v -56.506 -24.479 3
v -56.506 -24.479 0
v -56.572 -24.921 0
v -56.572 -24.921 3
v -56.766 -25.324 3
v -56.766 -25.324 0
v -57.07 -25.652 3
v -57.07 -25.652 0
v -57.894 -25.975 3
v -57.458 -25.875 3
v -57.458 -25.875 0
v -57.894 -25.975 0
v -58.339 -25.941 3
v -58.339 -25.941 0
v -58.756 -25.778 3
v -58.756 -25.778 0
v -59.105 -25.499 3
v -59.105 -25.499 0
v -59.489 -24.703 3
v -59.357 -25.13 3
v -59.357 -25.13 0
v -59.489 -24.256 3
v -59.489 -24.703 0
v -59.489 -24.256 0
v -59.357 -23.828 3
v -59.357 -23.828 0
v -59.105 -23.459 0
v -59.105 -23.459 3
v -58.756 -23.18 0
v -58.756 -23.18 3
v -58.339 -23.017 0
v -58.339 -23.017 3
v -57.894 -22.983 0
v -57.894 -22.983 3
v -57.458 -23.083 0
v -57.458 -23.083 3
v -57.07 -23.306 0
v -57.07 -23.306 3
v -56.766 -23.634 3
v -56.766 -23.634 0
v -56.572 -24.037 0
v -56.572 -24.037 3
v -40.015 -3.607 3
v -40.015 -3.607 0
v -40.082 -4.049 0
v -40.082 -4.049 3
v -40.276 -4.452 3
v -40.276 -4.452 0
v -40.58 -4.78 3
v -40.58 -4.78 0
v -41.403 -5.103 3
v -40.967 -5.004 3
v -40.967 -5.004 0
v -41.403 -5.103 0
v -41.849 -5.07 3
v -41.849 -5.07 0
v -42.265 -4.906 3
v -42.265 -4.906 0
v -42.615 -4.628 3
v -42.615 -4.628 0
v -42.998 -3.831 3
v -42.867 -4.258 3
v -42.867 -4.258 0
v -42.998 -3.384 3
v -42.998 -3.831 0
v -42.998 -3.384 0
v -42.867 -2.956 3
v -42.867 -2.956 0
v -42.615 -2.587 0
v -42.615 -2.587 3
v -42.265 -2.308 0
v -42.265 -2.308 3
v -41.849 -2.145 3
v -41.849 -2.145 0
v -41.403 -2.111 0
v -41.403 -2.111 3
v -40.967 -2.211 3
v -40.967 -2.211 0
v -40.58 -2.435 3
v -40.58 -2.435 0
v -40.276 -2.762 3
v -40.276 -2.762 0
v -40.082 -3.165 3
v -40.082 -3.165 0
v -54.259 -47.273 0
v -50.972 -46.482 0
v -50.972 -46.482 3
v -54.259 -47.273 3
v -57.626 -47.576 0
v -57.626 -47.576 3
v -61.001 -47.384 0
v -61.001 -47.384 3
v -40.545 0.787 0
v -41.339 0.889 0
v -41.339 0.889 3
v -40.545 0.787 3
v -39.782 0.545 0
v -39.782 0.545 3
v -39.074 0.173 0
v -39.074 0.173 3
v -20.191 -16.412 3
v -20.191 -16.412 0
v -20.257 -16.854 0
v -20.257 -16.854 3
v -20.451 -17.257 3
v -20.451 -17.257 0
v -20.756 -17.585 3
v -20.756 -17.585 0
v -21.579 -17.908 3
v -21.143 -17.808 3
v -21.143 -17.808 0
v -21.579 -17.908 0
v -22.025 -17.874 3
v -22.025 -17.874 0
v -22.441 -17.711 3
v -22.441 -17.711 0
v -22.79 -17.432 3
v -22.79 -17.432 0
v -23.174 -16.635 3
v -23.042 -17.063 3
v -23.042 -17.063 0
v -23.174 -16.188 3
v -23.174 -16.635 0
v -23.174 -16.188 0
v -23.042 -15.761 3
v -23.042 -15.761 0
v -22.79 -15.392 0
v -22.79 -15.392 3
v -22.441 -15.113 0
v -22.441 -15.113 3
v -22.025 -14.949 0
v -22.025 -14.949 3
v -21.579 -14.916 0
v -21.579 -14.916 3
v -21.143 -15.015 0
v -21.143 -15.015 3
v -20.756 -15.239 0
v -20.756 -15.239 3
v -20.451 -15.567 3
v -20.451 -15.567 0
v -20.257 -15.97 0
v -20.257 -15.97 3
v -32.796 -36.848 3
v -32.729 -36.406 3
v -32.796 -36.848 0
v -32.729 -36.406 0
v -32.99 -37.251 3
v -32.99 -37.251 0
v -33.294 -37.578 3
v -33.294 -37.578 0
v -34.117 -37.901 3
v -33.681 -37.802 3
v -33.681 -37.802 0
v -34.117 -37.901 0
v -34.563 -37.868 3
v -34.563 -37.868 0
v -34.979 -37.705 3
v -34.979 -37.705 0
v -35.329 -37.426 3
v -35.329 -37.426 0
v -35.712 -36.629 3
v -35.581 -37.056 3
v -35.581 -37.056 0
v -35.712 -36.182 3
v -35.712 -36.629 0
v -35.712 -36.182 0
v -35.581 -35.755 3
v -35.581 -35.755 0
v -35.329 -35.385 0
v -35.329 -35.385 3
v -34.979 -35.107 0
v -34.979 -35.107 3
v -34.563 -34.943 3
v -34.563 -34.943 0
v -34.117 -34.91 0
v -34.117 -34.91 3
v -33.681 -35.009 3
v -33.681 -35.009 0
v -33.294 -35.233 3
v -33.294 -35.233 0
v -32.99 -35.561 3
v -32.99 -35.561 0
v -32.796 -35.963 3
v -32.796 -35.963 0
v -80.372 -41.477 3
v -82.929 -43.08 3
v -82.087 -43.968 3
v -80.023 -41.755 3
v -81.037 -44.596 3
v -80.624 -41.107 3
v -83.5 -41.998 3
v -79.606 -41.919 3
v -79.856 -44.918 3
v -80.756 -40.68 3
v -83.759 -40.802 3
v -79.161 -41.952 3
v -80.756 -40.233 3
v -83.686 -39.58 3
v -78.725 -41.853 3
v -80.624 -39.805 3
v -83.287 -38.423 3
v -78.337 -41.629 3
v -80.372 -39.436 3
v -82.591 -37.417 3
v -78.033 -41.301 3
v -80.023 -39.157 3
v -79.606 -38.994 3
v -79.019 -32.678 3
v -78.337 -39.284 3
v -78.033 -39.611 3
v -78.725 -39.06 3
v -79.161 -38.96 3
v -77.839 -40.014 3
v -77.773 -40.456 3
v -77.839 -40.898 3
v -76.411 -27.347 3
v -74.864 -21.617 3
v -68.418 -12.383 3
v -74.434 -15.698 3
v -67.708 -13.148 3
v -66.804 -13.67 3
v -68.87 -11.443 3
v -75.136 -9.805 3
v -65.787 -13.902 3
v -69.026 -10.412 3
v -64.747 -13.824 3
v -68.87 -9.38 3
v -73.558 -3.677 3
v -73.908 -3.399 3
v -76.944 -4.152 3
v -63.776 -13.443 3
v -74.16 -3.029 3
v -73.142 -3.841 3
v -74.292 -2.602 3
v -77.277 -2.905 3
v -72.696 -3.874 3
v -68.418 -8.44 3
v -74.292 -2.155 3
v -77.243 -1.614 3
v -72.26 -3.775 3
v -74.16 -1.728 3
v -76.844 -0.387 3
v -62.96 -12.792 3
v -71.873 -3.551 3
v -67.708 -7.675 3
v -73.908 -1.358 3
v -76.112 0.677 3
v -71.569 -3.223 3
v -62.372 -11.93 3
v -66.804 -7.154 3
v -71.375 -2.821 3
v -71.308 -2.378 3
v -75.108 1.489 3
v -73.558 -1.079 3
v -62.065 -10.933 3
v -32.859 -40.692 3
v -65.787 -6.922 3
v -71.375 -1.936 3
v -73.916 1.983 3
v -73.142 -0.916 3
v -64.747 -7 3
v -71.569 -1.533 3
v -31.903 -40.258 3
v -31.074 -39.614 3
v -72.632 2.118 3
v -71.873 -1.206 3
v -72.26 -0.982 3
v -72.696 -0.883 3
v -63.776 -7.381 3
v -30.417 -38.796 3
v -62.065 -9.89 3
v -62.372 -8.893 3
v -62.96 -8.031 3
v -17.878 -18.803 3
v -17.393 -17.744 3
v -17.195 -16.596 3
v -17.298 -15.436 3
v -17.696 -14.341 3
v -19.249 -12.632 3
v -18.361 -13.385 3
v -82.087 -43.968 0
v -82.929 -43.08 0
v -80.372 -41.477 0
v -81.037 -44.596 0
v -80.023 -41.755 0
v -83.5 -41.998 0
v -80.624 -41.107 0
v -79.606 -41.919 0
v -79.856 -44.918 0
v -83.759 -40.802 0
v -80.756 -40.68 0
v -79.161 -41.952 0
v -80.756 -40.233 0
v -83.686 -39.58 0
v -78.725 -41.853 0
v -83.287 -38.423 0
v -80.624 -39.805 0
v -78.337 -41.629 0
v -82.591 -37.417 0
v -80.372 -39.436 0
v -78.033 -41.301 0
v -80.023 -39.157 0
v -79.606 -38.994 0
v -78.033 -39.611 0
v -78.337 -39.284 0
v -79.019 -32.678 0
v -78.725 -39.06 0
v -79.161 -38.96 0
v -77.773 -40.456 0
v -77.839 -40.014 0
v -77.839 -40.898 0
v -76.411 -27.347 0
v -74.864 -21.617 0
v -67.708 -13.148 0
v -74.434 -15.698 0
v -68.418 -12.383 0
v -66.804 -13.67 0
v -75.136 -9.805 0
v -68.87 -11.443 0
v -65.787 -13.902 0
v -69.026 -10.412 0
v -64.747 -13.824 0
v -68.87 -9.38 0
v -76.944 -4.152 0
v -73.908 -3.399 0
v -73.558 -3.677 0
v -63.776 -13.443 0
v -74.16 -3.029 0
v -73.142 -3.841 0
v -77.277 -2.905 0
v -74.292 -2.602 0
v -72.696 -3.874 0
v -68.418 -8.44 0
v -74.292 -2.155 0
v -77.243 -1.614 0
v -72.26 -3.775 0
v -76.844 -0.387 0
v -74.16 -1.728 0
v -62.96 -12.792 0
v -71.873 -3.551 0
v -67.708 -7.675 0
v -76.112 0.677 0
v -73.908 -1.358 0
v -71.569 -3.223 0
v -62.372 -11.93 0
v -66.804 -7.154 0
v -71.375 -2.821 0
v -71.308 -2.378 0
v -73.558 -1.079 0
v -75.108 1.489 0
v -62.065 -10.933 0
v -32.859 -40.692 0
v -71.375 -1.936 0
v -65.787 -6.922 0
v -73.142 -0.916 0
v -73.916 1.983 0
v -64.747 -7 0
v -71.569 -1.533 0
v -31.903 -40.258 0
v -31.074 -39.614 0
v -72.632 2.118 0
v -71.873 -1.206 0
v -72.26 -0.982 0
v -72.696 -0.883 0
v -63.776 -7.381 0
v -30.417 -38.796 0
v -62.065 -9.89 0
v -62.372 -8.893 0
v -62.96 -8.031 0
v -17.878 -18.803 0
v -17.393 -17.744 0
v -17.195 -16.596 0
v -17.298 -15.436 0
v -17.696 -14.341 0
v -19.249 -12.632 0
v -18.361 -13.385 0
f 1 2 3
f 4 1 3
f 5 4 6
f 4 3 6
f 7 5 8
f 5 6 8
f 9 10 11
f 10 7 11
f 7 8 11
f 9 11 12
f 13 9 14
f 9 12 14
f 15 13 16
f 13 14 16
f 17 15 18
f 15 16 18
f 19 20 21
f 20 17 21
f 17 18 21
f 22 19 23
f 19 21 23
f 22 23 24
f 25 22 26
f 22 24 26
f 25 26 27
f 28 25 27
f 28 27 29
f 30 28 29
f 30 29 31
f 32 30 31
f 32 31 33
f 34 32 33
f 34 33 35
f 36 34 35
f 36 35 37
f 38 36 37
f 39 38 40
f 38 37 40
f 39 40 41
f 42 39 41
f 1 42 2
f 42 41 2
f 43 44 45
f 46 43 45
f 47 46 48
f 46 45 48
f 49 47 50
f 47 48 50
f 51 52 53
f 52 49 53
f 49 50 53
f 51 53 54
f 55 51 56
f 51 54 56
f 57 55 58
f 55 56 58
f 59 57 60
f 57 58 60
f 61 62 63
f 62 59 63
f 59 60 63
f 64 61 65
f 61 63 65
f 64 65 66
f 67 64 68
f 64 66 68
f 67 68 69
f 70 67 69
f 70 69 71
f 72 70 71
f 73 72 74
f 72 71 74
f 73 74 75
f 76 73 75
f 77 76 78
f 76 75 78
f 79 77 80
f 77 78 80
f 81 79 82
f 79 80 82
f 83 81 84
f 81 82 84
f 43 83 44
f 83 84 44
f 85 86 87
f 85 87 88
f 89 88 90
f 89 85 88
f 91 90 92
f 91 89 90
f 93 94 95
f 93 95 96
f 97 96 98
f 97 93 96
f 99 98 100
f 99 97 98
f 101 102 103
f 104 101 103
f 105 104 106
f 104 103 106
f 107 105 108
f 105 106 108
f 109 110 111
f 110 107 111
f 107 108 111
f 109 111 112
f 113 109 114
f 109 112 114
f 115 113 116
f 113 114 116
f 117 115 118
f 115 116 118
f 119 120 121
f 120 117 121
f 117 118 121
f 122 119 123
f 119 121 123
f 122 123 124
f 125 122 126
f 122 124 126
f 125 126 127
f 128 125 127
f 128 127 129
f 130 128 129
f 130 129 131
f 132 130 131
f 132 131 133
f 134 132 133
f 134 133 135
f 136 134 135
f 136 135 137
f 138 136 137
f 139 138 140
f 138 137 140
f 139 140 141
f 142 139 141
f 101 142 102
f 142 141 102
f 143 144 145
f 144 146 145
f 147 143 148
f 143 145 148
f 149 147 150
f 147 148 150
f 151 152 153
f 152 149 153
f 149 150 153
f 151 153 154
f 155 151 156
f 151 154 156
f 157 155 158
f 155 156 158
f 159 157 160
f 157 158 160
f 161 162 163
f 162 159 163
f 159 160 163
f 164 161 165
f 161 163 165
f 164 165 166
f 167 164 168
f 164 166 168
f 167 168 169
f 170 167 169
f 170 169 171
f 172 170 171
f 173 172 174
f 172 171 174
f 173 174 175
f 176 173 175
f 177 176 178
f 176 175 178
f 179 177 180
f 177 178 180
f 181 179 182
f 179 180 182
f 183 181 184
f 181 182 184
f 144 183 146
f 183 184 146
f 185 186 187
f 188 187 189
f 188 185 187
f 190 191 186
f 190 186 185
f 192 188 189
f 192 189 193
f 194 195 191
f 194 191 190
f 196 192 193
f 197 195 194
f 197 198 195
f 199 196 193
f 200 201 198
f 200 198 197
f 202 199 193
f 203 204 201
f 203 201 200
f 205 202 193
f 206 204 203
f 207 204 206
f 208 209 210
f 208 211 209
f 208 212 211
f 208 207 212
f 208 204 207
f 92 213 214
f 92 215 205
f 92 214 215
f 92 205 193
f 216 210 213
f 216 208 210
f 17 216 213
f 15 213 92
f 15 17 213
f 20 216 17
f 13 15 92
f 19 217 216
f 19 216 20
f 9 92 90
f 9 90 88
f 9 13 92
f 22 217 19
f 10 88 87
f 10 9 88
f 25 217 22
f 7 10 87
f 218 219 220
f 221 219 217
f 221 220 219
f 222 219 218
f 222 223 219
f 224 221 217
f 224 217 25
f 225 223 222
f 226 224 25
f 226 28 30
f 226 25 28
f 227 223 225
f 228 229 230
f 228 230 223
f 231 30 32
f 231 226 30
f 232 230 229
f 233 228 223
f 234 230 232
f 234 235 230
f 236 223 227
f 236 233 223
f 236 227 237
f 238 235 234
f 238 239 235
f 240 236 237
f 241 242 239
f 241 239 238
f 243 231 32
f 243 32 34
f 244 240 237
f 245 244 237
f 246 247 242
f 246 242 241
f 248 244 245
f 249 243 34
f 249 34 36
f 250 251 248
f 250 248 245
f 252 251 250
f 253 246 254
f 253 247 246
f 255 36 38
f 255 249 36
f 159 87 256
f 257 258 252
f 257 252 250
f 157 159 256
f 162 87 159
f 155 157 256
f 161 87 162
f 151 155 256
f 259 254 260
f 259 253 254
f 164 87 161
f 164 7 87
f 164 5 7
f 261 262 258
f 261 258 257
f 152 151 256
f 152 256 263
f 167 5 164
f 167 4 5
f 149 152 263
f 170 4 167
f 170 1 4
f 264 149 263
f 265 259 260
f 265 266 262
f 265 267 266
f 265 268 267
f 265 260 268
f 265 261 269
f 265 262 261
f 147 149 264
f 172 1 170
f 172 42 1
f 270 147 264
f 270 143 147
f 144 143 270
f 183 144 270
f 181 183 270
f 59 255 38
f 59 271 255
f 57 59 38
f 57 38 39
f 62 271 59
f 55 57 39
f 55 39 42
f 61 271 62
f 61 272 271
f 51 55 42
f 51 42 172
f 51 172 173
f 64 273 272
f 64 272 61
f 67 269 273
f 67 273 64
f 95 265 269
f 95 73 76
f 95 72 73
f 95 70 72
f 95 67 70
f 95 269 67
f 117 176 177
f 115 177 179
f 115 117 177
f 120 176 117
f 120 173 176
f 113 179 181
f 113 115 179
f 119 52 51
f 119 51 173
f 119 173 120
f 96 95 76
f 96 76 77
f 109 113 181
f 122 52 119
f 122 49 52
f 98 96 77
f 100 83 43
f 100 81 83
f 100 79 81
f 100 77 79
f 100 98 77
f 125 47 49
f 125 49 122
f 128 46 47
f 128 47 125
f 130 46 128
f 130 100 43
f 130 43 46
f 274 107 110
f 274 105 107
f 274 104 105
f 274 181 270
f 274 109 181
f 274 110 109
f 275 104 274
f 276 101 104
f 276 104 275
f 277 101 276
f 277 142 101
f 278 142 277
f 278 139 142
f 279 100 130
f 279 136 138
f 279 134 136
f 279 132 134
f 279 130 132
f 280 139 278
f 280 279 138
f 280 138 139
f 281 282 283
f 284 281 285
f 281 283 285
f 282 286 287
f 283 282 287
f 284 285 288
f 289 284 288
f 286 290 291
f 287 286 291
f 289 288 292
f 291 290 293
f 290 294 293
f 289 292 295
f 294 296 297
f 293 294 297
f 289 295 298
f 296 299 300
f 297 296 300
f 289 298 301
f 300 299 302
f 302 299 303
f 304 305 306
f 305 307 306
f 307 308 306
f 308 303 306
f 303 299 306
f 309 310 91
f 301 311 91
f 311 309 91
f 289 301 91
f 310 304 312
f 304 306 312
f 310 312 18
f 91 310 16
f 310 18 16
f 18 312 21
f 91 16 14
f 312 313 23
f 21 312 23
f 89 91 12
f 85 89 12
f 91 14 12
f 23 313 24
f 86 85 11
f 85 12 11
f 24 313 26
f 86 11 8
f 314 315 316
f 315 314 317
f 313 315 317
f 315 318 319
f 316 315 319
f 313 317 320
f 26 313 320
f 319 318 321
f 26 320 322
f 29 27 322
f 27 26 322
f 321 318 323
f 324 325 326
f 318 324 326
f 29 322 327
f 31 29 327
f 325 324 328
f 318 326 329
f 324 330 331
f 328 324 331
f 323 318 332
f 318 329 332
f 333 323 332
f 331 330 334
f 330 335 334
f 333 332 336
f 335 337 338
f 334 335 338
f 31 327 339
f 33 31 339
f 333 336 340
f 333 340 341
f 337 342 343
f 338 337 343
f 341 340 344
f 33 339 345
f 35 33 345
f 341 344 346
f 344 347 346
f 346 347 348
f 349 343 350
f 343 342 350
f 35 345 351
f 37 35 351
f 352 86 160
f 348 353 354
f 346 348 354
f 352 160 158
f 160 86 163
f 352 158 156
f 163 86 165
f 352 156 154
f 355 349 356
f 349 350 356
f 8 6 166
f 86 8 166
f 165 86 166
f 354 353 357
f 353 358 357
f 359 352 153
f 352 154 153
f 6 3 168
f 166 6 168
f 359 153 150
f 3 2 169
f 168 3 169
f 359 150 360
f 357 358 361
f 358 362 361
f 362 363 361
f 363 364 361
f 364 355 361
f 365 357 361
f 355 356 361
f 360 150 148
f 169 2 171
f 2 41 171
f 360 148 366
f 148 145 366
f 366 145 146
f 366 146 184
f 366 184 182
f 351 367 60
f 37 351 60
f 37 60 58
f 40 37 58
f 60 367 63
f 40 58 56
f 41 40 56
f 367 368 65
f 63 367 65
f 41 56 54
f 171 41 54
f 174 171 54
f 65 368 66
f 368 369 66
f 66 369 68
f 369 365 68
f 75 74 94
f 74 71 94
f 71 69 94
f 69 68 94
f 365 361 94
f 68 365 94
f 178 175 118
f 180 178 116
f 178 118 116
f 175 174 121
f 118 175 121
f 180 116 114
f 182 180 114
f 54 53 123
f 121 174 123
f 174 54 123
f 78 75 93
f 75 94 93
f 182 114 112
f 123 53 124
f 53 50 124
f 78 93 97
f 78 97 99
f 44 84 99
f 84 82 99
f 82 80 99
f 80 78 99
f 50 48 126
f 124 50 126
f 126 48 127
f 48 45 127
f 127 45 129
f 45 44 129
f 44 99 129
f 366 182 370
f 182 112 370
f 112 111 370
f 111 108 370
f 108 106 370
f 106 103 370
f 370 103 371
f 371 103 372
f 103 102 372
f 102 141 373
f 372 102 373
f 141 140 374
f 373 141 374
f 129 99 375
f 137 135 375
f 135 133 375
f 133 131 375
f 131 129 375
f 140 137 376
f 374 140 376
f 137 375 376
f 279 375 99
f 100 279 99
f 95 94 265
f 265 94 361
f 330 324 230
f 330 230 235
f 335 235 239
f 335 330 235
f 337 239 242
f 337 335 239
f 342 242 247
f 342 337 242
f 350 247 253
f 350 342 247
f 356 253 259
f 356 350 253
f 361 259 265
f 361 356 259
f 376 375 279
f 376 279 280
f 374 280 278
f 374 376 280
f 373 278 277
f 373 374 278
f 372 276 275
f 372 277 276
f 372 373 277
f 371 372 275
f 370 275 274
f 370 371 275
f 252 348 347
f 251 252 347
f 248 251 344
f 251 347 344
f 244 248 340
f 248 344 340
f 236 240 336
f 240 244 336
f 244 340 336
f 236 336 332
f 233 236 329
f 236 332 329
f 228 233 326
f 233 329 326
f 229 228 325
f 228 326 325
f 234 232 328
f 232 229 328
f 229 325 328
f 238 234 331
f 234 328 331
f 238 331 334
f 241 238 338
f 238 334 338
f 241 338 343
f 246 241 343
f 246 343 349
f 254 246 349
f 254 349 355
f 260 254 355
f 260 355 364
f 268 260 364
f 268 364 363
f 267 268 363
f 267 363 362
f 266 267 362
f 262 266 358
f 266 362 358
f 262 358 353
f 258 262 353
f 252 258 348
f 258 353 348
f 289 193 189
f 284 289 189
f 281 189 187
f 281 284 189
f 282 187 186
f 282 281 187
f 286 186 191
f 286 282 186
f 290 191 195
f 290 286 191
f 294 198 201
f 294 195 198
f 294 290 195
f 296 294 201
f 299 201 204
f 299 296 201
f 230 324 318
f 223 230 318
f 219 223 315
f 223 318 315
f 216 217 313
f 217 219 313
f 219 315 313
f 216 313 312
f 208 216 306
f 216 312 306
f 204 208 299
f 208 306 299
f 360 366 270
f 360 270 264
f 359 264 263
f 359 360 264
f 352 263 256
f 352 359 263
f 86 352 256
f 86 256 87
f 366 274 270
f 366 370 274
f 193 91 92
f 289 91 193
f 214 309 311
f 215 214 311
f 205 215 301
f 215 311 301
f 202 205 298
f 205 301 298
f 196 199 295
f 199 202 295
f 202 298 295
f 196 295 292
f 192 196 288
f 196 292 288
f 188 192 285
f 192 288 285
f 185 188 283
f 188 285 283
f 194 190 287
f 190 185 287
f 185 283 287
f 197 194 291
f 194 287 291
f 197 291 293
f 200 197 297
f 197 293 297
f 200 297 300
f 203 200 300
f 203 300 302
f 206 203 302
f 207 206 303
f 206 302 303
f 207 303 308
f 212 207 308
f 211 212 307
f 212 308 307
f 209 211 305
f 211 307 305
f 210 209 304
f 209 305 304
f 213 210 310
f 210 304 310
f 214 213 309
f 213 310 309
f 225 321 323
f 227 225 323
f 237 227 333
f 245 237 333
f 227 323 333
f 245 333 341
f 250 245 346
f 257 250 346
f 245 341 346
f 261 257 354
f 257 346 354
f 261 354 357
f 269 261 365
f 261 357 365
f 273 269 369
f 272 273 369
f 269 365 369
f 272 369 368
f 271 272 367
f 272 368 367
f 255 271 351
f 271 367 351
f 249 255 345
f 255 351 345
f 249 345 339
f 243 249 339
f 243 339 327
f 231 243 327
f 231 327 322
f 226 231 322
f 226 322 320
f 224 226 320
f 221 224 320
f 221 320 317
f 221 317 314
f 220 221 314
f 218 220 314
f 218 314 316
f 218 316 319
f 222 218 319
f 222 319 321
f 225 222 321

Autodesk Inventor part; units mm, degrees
ref_plane "YZ Plane" through (0, 0, 0) normal (1, 0, 0) x (0, 1, 0)
ref_plane "XZ Plane" through (0, 0, 0) normal (0, 1, 0) x (-1, 0, 0)
ref_plane "XY Plane" through (0, 0, 0) normal (0, 0, 1) x (1, 0, 0)
sketch "スケッチ1" plane through (0, 0, 0) normal (0, 0, 1) x (1, 0, 0)
  circle A0 centre (-21.6908, -16.4118) radius 19.1 construction
  circle A1 centre (-58.0056, -24.4791) radius 22.1 construction
  circle A2 centre (-105.5257, -16.4118) radius 30.1 construction
  circle A3 centre (-122.6945, 30.2622) radius 1.5
  circle A4 centre (-75.5257, 23.124) radius 1.5
  circle A5 centre (-65.5257, -10.4118) radius 1.5
  circle A6 centre (-145.5257, 0.5882) radius 1.5
  circle A7 centre (-105.5257, -16.4118) radius 7.025
  circle A8 centre (-21.6908, -16.4118) radius 1.5
  arc A9 (-17.8785, -18.8026) -> (-19.2493, -12.6317) centre (-21.6908, -16.4118) ccw
  arc A10 (-61.0009, -47.384) -> (-50.9717, -46.4821) centre (-58.0056, -24.4791) ccw
  circle A11 centre (-34.2292, -36.4056) radius 1.5
  circle A12 centre (-41.5152, -3.6073) radius 1.5
  arc A13 (-39.0737, 0.1727) -> (-41.3386, 0.8892) centre (-41.5152, -3.6073) ccw
  arc A14 (-32.8589, -40.6919) -> (-30.4168, -38.7963) centre (-34.2292, -36.4056) ccw
  circle A15 centre (-79.2726, -40.4563) radius 1.5
  circle A16 centre (-79.2726, -40.4563) radius 4.5
  line L0 (-17.8785, -18.8026) -> (-30.4168, -38.7963)
  line L1 (-32.8589, -40.6919) -> (-50.9717, -46.4821)
  line L2 (-19.2493, -12.6317) -> (-39.0737, 0.1727)
  arc A17 (-149.0922, 3.3323) -> (-149.4523, -1.6098) centre (-145.5257, 0.5882) ccw
  line L3 (-149.4523, -1.6098) -> (-132.6633, -31.6026)
  line L4 (-102.3494, -47.3492) -> (-78.813, -44.9328)
  line L5 (-61.0009, -47.384) -> (-79.8561, -44.9183)
  circle A18 centre (-72.8083, -2.3784) radius 1.5
  arc A19 (-72.6317, 2.1181) -> (-76.944, -4.1523) centre (-72.8083, -2.3784) ccw
  line L6 (-41.3386, 0.8892) -> (-72.6317, 2.1181)
  arc A20 (-61.4337, -12.2841) -> (-61.2133, -9.1259) centre (-65.5257, -10.4118) ccw
  line L7 (-61.4337, -12.2841) -> (-75.1806, -42.3286)
  arc A21 (-82.5911, -37.417) -> (-76.944, -4.1523) centre (-105.5257, -16.4118) ccw
  arc A22 (-132.6633, -31.6026) -> (-102.3494, -47.3492) centre (-105.5257, -16.4118) ccw
  arc A23 (-122.0212, 34.7115) -> (-126.261, 33.0062) centre (-122.6945, 30.2622) ccw
  arc A24 (-71.2133, 24.4099) -> (-74.8523, 27.5733) centre (-75.5257, 23.124) ccw
  line L8 (-126.261, 33.0062) -> (-149.0922, 3.3323)
  line L9 (-122.0212, 34.7115) -> (-74.8523, 27.5733)
  line L10 (-71.2133, 24.4099) -> (-61.2133, -9.1259)
  circle A25 centre (-58.0056, -24.4791) radius 1.5
  point P0 (0, 0)
  point P1 (0, 0)
  dimension "d0" = 14.05
  dimension "d1" = 3
  dimension "d2" = 3
  dimension "d3" = 1
  dimension "d4" = 3
  dimension "d5" = 3
  dimension "d6" = 3
  dimension "d7" = 3
  dimension "d8" = 3
  dimension "d9" = 3
  dimension "d10" = 9
  dimension "d11" = 3
  dimension "d12" = 3
  dimension "d13" = 9
  dimension "d14" = 31.1
  dimension "d15" = 31.1
  dimension "d16" = 9
  dimension "d17" = 9
  dimension "d18" = 3
extrude "押し出し1" add sketch "スケッチ1" along normal blind 3 contours L0 A14 L1 A10 L5 L4 A16 L7 A20 L10 L6 A13 L2 A9 | L10 A20 L7 A16 A21 A19 L6 | L5 A16 L4 | A16
sketch "スケッチ2" plane through (0, 0, 0) normal (0, 0, -1) x (-1, 0, 0)
  circle A0 centre (58.0056, -24.4791) radius 1.5 projected
  circle A1 centre (72.8083, -2.3784) radius 1.5 projected
  circle A2 centre (41.5152, -3.6073) radius 1.5 projected
  circle A3 centre (34.2292, -36.4056) radius 1.5 projected
  circle A4 centre (21.6908, -16.4118) radius 1.5 projected
  circle A5 centre (65.5257, -10.4118) radius 1.5 projected
  circle A6 centre (79.2726, -40.4563) radius 1.5 projected
  arc A7 (79.8561, -44.9183) -> (82.5911, -37.417) centre (79.2726, -40.4563) ccw projected
  arc A8 (76.944, -4.1523) -> (82.5911, -37.417) centre (105.5257, -16.4118) ccw projected
  arc A9 (76.944, -4.1523) -> (72.6317, 2.1181) centre (72.8083, -2.3784) ccw projected
  line L0 (41.3386, 0.8892) -> (72.6317, 2.1181) projected
  arc A10 (41.3386, 0.8892) -> (39.0737, 0.1727) centre (41.5152, -3.6073) ccw projected
  line L1 (19.2493, -12.6317) -> (39.0737, 0.1727) projected
  arc A11 (19.2493, -12.6317) -> (17.8785, -18.8026) centre (21.6908, -16.4118) ccw projected
  line L2 (30.4168, -38.7963) -> (17.8785, -18.8026) projected
  arc A12 (30.4168, -38.7963) -> (32.8589, -40.6919) centre (34.2292, -36.4056) ccw projected
  line L3 (50.9717, -46.4821) -> (32.8589, -40.6919) projected
  arc A13 (50.9717, -46.4821) -> (61.0009, -47.384) centre (58.0056, -24.4791) ccw projected
  line L4 (79.8561, -44.9183) -> (61.0009, -47.384) projected
  circle A14 centre (65.5257, -10.4118) radius 3.5
  point P0 (0, 0)
  dimension "d21" = 7
extrude "押し出し2" cut sketch "スケッチ2" against normal blind 10 contours A14
properties part number "後ろ脚内フレーム" material "アルミニウム 7075"
